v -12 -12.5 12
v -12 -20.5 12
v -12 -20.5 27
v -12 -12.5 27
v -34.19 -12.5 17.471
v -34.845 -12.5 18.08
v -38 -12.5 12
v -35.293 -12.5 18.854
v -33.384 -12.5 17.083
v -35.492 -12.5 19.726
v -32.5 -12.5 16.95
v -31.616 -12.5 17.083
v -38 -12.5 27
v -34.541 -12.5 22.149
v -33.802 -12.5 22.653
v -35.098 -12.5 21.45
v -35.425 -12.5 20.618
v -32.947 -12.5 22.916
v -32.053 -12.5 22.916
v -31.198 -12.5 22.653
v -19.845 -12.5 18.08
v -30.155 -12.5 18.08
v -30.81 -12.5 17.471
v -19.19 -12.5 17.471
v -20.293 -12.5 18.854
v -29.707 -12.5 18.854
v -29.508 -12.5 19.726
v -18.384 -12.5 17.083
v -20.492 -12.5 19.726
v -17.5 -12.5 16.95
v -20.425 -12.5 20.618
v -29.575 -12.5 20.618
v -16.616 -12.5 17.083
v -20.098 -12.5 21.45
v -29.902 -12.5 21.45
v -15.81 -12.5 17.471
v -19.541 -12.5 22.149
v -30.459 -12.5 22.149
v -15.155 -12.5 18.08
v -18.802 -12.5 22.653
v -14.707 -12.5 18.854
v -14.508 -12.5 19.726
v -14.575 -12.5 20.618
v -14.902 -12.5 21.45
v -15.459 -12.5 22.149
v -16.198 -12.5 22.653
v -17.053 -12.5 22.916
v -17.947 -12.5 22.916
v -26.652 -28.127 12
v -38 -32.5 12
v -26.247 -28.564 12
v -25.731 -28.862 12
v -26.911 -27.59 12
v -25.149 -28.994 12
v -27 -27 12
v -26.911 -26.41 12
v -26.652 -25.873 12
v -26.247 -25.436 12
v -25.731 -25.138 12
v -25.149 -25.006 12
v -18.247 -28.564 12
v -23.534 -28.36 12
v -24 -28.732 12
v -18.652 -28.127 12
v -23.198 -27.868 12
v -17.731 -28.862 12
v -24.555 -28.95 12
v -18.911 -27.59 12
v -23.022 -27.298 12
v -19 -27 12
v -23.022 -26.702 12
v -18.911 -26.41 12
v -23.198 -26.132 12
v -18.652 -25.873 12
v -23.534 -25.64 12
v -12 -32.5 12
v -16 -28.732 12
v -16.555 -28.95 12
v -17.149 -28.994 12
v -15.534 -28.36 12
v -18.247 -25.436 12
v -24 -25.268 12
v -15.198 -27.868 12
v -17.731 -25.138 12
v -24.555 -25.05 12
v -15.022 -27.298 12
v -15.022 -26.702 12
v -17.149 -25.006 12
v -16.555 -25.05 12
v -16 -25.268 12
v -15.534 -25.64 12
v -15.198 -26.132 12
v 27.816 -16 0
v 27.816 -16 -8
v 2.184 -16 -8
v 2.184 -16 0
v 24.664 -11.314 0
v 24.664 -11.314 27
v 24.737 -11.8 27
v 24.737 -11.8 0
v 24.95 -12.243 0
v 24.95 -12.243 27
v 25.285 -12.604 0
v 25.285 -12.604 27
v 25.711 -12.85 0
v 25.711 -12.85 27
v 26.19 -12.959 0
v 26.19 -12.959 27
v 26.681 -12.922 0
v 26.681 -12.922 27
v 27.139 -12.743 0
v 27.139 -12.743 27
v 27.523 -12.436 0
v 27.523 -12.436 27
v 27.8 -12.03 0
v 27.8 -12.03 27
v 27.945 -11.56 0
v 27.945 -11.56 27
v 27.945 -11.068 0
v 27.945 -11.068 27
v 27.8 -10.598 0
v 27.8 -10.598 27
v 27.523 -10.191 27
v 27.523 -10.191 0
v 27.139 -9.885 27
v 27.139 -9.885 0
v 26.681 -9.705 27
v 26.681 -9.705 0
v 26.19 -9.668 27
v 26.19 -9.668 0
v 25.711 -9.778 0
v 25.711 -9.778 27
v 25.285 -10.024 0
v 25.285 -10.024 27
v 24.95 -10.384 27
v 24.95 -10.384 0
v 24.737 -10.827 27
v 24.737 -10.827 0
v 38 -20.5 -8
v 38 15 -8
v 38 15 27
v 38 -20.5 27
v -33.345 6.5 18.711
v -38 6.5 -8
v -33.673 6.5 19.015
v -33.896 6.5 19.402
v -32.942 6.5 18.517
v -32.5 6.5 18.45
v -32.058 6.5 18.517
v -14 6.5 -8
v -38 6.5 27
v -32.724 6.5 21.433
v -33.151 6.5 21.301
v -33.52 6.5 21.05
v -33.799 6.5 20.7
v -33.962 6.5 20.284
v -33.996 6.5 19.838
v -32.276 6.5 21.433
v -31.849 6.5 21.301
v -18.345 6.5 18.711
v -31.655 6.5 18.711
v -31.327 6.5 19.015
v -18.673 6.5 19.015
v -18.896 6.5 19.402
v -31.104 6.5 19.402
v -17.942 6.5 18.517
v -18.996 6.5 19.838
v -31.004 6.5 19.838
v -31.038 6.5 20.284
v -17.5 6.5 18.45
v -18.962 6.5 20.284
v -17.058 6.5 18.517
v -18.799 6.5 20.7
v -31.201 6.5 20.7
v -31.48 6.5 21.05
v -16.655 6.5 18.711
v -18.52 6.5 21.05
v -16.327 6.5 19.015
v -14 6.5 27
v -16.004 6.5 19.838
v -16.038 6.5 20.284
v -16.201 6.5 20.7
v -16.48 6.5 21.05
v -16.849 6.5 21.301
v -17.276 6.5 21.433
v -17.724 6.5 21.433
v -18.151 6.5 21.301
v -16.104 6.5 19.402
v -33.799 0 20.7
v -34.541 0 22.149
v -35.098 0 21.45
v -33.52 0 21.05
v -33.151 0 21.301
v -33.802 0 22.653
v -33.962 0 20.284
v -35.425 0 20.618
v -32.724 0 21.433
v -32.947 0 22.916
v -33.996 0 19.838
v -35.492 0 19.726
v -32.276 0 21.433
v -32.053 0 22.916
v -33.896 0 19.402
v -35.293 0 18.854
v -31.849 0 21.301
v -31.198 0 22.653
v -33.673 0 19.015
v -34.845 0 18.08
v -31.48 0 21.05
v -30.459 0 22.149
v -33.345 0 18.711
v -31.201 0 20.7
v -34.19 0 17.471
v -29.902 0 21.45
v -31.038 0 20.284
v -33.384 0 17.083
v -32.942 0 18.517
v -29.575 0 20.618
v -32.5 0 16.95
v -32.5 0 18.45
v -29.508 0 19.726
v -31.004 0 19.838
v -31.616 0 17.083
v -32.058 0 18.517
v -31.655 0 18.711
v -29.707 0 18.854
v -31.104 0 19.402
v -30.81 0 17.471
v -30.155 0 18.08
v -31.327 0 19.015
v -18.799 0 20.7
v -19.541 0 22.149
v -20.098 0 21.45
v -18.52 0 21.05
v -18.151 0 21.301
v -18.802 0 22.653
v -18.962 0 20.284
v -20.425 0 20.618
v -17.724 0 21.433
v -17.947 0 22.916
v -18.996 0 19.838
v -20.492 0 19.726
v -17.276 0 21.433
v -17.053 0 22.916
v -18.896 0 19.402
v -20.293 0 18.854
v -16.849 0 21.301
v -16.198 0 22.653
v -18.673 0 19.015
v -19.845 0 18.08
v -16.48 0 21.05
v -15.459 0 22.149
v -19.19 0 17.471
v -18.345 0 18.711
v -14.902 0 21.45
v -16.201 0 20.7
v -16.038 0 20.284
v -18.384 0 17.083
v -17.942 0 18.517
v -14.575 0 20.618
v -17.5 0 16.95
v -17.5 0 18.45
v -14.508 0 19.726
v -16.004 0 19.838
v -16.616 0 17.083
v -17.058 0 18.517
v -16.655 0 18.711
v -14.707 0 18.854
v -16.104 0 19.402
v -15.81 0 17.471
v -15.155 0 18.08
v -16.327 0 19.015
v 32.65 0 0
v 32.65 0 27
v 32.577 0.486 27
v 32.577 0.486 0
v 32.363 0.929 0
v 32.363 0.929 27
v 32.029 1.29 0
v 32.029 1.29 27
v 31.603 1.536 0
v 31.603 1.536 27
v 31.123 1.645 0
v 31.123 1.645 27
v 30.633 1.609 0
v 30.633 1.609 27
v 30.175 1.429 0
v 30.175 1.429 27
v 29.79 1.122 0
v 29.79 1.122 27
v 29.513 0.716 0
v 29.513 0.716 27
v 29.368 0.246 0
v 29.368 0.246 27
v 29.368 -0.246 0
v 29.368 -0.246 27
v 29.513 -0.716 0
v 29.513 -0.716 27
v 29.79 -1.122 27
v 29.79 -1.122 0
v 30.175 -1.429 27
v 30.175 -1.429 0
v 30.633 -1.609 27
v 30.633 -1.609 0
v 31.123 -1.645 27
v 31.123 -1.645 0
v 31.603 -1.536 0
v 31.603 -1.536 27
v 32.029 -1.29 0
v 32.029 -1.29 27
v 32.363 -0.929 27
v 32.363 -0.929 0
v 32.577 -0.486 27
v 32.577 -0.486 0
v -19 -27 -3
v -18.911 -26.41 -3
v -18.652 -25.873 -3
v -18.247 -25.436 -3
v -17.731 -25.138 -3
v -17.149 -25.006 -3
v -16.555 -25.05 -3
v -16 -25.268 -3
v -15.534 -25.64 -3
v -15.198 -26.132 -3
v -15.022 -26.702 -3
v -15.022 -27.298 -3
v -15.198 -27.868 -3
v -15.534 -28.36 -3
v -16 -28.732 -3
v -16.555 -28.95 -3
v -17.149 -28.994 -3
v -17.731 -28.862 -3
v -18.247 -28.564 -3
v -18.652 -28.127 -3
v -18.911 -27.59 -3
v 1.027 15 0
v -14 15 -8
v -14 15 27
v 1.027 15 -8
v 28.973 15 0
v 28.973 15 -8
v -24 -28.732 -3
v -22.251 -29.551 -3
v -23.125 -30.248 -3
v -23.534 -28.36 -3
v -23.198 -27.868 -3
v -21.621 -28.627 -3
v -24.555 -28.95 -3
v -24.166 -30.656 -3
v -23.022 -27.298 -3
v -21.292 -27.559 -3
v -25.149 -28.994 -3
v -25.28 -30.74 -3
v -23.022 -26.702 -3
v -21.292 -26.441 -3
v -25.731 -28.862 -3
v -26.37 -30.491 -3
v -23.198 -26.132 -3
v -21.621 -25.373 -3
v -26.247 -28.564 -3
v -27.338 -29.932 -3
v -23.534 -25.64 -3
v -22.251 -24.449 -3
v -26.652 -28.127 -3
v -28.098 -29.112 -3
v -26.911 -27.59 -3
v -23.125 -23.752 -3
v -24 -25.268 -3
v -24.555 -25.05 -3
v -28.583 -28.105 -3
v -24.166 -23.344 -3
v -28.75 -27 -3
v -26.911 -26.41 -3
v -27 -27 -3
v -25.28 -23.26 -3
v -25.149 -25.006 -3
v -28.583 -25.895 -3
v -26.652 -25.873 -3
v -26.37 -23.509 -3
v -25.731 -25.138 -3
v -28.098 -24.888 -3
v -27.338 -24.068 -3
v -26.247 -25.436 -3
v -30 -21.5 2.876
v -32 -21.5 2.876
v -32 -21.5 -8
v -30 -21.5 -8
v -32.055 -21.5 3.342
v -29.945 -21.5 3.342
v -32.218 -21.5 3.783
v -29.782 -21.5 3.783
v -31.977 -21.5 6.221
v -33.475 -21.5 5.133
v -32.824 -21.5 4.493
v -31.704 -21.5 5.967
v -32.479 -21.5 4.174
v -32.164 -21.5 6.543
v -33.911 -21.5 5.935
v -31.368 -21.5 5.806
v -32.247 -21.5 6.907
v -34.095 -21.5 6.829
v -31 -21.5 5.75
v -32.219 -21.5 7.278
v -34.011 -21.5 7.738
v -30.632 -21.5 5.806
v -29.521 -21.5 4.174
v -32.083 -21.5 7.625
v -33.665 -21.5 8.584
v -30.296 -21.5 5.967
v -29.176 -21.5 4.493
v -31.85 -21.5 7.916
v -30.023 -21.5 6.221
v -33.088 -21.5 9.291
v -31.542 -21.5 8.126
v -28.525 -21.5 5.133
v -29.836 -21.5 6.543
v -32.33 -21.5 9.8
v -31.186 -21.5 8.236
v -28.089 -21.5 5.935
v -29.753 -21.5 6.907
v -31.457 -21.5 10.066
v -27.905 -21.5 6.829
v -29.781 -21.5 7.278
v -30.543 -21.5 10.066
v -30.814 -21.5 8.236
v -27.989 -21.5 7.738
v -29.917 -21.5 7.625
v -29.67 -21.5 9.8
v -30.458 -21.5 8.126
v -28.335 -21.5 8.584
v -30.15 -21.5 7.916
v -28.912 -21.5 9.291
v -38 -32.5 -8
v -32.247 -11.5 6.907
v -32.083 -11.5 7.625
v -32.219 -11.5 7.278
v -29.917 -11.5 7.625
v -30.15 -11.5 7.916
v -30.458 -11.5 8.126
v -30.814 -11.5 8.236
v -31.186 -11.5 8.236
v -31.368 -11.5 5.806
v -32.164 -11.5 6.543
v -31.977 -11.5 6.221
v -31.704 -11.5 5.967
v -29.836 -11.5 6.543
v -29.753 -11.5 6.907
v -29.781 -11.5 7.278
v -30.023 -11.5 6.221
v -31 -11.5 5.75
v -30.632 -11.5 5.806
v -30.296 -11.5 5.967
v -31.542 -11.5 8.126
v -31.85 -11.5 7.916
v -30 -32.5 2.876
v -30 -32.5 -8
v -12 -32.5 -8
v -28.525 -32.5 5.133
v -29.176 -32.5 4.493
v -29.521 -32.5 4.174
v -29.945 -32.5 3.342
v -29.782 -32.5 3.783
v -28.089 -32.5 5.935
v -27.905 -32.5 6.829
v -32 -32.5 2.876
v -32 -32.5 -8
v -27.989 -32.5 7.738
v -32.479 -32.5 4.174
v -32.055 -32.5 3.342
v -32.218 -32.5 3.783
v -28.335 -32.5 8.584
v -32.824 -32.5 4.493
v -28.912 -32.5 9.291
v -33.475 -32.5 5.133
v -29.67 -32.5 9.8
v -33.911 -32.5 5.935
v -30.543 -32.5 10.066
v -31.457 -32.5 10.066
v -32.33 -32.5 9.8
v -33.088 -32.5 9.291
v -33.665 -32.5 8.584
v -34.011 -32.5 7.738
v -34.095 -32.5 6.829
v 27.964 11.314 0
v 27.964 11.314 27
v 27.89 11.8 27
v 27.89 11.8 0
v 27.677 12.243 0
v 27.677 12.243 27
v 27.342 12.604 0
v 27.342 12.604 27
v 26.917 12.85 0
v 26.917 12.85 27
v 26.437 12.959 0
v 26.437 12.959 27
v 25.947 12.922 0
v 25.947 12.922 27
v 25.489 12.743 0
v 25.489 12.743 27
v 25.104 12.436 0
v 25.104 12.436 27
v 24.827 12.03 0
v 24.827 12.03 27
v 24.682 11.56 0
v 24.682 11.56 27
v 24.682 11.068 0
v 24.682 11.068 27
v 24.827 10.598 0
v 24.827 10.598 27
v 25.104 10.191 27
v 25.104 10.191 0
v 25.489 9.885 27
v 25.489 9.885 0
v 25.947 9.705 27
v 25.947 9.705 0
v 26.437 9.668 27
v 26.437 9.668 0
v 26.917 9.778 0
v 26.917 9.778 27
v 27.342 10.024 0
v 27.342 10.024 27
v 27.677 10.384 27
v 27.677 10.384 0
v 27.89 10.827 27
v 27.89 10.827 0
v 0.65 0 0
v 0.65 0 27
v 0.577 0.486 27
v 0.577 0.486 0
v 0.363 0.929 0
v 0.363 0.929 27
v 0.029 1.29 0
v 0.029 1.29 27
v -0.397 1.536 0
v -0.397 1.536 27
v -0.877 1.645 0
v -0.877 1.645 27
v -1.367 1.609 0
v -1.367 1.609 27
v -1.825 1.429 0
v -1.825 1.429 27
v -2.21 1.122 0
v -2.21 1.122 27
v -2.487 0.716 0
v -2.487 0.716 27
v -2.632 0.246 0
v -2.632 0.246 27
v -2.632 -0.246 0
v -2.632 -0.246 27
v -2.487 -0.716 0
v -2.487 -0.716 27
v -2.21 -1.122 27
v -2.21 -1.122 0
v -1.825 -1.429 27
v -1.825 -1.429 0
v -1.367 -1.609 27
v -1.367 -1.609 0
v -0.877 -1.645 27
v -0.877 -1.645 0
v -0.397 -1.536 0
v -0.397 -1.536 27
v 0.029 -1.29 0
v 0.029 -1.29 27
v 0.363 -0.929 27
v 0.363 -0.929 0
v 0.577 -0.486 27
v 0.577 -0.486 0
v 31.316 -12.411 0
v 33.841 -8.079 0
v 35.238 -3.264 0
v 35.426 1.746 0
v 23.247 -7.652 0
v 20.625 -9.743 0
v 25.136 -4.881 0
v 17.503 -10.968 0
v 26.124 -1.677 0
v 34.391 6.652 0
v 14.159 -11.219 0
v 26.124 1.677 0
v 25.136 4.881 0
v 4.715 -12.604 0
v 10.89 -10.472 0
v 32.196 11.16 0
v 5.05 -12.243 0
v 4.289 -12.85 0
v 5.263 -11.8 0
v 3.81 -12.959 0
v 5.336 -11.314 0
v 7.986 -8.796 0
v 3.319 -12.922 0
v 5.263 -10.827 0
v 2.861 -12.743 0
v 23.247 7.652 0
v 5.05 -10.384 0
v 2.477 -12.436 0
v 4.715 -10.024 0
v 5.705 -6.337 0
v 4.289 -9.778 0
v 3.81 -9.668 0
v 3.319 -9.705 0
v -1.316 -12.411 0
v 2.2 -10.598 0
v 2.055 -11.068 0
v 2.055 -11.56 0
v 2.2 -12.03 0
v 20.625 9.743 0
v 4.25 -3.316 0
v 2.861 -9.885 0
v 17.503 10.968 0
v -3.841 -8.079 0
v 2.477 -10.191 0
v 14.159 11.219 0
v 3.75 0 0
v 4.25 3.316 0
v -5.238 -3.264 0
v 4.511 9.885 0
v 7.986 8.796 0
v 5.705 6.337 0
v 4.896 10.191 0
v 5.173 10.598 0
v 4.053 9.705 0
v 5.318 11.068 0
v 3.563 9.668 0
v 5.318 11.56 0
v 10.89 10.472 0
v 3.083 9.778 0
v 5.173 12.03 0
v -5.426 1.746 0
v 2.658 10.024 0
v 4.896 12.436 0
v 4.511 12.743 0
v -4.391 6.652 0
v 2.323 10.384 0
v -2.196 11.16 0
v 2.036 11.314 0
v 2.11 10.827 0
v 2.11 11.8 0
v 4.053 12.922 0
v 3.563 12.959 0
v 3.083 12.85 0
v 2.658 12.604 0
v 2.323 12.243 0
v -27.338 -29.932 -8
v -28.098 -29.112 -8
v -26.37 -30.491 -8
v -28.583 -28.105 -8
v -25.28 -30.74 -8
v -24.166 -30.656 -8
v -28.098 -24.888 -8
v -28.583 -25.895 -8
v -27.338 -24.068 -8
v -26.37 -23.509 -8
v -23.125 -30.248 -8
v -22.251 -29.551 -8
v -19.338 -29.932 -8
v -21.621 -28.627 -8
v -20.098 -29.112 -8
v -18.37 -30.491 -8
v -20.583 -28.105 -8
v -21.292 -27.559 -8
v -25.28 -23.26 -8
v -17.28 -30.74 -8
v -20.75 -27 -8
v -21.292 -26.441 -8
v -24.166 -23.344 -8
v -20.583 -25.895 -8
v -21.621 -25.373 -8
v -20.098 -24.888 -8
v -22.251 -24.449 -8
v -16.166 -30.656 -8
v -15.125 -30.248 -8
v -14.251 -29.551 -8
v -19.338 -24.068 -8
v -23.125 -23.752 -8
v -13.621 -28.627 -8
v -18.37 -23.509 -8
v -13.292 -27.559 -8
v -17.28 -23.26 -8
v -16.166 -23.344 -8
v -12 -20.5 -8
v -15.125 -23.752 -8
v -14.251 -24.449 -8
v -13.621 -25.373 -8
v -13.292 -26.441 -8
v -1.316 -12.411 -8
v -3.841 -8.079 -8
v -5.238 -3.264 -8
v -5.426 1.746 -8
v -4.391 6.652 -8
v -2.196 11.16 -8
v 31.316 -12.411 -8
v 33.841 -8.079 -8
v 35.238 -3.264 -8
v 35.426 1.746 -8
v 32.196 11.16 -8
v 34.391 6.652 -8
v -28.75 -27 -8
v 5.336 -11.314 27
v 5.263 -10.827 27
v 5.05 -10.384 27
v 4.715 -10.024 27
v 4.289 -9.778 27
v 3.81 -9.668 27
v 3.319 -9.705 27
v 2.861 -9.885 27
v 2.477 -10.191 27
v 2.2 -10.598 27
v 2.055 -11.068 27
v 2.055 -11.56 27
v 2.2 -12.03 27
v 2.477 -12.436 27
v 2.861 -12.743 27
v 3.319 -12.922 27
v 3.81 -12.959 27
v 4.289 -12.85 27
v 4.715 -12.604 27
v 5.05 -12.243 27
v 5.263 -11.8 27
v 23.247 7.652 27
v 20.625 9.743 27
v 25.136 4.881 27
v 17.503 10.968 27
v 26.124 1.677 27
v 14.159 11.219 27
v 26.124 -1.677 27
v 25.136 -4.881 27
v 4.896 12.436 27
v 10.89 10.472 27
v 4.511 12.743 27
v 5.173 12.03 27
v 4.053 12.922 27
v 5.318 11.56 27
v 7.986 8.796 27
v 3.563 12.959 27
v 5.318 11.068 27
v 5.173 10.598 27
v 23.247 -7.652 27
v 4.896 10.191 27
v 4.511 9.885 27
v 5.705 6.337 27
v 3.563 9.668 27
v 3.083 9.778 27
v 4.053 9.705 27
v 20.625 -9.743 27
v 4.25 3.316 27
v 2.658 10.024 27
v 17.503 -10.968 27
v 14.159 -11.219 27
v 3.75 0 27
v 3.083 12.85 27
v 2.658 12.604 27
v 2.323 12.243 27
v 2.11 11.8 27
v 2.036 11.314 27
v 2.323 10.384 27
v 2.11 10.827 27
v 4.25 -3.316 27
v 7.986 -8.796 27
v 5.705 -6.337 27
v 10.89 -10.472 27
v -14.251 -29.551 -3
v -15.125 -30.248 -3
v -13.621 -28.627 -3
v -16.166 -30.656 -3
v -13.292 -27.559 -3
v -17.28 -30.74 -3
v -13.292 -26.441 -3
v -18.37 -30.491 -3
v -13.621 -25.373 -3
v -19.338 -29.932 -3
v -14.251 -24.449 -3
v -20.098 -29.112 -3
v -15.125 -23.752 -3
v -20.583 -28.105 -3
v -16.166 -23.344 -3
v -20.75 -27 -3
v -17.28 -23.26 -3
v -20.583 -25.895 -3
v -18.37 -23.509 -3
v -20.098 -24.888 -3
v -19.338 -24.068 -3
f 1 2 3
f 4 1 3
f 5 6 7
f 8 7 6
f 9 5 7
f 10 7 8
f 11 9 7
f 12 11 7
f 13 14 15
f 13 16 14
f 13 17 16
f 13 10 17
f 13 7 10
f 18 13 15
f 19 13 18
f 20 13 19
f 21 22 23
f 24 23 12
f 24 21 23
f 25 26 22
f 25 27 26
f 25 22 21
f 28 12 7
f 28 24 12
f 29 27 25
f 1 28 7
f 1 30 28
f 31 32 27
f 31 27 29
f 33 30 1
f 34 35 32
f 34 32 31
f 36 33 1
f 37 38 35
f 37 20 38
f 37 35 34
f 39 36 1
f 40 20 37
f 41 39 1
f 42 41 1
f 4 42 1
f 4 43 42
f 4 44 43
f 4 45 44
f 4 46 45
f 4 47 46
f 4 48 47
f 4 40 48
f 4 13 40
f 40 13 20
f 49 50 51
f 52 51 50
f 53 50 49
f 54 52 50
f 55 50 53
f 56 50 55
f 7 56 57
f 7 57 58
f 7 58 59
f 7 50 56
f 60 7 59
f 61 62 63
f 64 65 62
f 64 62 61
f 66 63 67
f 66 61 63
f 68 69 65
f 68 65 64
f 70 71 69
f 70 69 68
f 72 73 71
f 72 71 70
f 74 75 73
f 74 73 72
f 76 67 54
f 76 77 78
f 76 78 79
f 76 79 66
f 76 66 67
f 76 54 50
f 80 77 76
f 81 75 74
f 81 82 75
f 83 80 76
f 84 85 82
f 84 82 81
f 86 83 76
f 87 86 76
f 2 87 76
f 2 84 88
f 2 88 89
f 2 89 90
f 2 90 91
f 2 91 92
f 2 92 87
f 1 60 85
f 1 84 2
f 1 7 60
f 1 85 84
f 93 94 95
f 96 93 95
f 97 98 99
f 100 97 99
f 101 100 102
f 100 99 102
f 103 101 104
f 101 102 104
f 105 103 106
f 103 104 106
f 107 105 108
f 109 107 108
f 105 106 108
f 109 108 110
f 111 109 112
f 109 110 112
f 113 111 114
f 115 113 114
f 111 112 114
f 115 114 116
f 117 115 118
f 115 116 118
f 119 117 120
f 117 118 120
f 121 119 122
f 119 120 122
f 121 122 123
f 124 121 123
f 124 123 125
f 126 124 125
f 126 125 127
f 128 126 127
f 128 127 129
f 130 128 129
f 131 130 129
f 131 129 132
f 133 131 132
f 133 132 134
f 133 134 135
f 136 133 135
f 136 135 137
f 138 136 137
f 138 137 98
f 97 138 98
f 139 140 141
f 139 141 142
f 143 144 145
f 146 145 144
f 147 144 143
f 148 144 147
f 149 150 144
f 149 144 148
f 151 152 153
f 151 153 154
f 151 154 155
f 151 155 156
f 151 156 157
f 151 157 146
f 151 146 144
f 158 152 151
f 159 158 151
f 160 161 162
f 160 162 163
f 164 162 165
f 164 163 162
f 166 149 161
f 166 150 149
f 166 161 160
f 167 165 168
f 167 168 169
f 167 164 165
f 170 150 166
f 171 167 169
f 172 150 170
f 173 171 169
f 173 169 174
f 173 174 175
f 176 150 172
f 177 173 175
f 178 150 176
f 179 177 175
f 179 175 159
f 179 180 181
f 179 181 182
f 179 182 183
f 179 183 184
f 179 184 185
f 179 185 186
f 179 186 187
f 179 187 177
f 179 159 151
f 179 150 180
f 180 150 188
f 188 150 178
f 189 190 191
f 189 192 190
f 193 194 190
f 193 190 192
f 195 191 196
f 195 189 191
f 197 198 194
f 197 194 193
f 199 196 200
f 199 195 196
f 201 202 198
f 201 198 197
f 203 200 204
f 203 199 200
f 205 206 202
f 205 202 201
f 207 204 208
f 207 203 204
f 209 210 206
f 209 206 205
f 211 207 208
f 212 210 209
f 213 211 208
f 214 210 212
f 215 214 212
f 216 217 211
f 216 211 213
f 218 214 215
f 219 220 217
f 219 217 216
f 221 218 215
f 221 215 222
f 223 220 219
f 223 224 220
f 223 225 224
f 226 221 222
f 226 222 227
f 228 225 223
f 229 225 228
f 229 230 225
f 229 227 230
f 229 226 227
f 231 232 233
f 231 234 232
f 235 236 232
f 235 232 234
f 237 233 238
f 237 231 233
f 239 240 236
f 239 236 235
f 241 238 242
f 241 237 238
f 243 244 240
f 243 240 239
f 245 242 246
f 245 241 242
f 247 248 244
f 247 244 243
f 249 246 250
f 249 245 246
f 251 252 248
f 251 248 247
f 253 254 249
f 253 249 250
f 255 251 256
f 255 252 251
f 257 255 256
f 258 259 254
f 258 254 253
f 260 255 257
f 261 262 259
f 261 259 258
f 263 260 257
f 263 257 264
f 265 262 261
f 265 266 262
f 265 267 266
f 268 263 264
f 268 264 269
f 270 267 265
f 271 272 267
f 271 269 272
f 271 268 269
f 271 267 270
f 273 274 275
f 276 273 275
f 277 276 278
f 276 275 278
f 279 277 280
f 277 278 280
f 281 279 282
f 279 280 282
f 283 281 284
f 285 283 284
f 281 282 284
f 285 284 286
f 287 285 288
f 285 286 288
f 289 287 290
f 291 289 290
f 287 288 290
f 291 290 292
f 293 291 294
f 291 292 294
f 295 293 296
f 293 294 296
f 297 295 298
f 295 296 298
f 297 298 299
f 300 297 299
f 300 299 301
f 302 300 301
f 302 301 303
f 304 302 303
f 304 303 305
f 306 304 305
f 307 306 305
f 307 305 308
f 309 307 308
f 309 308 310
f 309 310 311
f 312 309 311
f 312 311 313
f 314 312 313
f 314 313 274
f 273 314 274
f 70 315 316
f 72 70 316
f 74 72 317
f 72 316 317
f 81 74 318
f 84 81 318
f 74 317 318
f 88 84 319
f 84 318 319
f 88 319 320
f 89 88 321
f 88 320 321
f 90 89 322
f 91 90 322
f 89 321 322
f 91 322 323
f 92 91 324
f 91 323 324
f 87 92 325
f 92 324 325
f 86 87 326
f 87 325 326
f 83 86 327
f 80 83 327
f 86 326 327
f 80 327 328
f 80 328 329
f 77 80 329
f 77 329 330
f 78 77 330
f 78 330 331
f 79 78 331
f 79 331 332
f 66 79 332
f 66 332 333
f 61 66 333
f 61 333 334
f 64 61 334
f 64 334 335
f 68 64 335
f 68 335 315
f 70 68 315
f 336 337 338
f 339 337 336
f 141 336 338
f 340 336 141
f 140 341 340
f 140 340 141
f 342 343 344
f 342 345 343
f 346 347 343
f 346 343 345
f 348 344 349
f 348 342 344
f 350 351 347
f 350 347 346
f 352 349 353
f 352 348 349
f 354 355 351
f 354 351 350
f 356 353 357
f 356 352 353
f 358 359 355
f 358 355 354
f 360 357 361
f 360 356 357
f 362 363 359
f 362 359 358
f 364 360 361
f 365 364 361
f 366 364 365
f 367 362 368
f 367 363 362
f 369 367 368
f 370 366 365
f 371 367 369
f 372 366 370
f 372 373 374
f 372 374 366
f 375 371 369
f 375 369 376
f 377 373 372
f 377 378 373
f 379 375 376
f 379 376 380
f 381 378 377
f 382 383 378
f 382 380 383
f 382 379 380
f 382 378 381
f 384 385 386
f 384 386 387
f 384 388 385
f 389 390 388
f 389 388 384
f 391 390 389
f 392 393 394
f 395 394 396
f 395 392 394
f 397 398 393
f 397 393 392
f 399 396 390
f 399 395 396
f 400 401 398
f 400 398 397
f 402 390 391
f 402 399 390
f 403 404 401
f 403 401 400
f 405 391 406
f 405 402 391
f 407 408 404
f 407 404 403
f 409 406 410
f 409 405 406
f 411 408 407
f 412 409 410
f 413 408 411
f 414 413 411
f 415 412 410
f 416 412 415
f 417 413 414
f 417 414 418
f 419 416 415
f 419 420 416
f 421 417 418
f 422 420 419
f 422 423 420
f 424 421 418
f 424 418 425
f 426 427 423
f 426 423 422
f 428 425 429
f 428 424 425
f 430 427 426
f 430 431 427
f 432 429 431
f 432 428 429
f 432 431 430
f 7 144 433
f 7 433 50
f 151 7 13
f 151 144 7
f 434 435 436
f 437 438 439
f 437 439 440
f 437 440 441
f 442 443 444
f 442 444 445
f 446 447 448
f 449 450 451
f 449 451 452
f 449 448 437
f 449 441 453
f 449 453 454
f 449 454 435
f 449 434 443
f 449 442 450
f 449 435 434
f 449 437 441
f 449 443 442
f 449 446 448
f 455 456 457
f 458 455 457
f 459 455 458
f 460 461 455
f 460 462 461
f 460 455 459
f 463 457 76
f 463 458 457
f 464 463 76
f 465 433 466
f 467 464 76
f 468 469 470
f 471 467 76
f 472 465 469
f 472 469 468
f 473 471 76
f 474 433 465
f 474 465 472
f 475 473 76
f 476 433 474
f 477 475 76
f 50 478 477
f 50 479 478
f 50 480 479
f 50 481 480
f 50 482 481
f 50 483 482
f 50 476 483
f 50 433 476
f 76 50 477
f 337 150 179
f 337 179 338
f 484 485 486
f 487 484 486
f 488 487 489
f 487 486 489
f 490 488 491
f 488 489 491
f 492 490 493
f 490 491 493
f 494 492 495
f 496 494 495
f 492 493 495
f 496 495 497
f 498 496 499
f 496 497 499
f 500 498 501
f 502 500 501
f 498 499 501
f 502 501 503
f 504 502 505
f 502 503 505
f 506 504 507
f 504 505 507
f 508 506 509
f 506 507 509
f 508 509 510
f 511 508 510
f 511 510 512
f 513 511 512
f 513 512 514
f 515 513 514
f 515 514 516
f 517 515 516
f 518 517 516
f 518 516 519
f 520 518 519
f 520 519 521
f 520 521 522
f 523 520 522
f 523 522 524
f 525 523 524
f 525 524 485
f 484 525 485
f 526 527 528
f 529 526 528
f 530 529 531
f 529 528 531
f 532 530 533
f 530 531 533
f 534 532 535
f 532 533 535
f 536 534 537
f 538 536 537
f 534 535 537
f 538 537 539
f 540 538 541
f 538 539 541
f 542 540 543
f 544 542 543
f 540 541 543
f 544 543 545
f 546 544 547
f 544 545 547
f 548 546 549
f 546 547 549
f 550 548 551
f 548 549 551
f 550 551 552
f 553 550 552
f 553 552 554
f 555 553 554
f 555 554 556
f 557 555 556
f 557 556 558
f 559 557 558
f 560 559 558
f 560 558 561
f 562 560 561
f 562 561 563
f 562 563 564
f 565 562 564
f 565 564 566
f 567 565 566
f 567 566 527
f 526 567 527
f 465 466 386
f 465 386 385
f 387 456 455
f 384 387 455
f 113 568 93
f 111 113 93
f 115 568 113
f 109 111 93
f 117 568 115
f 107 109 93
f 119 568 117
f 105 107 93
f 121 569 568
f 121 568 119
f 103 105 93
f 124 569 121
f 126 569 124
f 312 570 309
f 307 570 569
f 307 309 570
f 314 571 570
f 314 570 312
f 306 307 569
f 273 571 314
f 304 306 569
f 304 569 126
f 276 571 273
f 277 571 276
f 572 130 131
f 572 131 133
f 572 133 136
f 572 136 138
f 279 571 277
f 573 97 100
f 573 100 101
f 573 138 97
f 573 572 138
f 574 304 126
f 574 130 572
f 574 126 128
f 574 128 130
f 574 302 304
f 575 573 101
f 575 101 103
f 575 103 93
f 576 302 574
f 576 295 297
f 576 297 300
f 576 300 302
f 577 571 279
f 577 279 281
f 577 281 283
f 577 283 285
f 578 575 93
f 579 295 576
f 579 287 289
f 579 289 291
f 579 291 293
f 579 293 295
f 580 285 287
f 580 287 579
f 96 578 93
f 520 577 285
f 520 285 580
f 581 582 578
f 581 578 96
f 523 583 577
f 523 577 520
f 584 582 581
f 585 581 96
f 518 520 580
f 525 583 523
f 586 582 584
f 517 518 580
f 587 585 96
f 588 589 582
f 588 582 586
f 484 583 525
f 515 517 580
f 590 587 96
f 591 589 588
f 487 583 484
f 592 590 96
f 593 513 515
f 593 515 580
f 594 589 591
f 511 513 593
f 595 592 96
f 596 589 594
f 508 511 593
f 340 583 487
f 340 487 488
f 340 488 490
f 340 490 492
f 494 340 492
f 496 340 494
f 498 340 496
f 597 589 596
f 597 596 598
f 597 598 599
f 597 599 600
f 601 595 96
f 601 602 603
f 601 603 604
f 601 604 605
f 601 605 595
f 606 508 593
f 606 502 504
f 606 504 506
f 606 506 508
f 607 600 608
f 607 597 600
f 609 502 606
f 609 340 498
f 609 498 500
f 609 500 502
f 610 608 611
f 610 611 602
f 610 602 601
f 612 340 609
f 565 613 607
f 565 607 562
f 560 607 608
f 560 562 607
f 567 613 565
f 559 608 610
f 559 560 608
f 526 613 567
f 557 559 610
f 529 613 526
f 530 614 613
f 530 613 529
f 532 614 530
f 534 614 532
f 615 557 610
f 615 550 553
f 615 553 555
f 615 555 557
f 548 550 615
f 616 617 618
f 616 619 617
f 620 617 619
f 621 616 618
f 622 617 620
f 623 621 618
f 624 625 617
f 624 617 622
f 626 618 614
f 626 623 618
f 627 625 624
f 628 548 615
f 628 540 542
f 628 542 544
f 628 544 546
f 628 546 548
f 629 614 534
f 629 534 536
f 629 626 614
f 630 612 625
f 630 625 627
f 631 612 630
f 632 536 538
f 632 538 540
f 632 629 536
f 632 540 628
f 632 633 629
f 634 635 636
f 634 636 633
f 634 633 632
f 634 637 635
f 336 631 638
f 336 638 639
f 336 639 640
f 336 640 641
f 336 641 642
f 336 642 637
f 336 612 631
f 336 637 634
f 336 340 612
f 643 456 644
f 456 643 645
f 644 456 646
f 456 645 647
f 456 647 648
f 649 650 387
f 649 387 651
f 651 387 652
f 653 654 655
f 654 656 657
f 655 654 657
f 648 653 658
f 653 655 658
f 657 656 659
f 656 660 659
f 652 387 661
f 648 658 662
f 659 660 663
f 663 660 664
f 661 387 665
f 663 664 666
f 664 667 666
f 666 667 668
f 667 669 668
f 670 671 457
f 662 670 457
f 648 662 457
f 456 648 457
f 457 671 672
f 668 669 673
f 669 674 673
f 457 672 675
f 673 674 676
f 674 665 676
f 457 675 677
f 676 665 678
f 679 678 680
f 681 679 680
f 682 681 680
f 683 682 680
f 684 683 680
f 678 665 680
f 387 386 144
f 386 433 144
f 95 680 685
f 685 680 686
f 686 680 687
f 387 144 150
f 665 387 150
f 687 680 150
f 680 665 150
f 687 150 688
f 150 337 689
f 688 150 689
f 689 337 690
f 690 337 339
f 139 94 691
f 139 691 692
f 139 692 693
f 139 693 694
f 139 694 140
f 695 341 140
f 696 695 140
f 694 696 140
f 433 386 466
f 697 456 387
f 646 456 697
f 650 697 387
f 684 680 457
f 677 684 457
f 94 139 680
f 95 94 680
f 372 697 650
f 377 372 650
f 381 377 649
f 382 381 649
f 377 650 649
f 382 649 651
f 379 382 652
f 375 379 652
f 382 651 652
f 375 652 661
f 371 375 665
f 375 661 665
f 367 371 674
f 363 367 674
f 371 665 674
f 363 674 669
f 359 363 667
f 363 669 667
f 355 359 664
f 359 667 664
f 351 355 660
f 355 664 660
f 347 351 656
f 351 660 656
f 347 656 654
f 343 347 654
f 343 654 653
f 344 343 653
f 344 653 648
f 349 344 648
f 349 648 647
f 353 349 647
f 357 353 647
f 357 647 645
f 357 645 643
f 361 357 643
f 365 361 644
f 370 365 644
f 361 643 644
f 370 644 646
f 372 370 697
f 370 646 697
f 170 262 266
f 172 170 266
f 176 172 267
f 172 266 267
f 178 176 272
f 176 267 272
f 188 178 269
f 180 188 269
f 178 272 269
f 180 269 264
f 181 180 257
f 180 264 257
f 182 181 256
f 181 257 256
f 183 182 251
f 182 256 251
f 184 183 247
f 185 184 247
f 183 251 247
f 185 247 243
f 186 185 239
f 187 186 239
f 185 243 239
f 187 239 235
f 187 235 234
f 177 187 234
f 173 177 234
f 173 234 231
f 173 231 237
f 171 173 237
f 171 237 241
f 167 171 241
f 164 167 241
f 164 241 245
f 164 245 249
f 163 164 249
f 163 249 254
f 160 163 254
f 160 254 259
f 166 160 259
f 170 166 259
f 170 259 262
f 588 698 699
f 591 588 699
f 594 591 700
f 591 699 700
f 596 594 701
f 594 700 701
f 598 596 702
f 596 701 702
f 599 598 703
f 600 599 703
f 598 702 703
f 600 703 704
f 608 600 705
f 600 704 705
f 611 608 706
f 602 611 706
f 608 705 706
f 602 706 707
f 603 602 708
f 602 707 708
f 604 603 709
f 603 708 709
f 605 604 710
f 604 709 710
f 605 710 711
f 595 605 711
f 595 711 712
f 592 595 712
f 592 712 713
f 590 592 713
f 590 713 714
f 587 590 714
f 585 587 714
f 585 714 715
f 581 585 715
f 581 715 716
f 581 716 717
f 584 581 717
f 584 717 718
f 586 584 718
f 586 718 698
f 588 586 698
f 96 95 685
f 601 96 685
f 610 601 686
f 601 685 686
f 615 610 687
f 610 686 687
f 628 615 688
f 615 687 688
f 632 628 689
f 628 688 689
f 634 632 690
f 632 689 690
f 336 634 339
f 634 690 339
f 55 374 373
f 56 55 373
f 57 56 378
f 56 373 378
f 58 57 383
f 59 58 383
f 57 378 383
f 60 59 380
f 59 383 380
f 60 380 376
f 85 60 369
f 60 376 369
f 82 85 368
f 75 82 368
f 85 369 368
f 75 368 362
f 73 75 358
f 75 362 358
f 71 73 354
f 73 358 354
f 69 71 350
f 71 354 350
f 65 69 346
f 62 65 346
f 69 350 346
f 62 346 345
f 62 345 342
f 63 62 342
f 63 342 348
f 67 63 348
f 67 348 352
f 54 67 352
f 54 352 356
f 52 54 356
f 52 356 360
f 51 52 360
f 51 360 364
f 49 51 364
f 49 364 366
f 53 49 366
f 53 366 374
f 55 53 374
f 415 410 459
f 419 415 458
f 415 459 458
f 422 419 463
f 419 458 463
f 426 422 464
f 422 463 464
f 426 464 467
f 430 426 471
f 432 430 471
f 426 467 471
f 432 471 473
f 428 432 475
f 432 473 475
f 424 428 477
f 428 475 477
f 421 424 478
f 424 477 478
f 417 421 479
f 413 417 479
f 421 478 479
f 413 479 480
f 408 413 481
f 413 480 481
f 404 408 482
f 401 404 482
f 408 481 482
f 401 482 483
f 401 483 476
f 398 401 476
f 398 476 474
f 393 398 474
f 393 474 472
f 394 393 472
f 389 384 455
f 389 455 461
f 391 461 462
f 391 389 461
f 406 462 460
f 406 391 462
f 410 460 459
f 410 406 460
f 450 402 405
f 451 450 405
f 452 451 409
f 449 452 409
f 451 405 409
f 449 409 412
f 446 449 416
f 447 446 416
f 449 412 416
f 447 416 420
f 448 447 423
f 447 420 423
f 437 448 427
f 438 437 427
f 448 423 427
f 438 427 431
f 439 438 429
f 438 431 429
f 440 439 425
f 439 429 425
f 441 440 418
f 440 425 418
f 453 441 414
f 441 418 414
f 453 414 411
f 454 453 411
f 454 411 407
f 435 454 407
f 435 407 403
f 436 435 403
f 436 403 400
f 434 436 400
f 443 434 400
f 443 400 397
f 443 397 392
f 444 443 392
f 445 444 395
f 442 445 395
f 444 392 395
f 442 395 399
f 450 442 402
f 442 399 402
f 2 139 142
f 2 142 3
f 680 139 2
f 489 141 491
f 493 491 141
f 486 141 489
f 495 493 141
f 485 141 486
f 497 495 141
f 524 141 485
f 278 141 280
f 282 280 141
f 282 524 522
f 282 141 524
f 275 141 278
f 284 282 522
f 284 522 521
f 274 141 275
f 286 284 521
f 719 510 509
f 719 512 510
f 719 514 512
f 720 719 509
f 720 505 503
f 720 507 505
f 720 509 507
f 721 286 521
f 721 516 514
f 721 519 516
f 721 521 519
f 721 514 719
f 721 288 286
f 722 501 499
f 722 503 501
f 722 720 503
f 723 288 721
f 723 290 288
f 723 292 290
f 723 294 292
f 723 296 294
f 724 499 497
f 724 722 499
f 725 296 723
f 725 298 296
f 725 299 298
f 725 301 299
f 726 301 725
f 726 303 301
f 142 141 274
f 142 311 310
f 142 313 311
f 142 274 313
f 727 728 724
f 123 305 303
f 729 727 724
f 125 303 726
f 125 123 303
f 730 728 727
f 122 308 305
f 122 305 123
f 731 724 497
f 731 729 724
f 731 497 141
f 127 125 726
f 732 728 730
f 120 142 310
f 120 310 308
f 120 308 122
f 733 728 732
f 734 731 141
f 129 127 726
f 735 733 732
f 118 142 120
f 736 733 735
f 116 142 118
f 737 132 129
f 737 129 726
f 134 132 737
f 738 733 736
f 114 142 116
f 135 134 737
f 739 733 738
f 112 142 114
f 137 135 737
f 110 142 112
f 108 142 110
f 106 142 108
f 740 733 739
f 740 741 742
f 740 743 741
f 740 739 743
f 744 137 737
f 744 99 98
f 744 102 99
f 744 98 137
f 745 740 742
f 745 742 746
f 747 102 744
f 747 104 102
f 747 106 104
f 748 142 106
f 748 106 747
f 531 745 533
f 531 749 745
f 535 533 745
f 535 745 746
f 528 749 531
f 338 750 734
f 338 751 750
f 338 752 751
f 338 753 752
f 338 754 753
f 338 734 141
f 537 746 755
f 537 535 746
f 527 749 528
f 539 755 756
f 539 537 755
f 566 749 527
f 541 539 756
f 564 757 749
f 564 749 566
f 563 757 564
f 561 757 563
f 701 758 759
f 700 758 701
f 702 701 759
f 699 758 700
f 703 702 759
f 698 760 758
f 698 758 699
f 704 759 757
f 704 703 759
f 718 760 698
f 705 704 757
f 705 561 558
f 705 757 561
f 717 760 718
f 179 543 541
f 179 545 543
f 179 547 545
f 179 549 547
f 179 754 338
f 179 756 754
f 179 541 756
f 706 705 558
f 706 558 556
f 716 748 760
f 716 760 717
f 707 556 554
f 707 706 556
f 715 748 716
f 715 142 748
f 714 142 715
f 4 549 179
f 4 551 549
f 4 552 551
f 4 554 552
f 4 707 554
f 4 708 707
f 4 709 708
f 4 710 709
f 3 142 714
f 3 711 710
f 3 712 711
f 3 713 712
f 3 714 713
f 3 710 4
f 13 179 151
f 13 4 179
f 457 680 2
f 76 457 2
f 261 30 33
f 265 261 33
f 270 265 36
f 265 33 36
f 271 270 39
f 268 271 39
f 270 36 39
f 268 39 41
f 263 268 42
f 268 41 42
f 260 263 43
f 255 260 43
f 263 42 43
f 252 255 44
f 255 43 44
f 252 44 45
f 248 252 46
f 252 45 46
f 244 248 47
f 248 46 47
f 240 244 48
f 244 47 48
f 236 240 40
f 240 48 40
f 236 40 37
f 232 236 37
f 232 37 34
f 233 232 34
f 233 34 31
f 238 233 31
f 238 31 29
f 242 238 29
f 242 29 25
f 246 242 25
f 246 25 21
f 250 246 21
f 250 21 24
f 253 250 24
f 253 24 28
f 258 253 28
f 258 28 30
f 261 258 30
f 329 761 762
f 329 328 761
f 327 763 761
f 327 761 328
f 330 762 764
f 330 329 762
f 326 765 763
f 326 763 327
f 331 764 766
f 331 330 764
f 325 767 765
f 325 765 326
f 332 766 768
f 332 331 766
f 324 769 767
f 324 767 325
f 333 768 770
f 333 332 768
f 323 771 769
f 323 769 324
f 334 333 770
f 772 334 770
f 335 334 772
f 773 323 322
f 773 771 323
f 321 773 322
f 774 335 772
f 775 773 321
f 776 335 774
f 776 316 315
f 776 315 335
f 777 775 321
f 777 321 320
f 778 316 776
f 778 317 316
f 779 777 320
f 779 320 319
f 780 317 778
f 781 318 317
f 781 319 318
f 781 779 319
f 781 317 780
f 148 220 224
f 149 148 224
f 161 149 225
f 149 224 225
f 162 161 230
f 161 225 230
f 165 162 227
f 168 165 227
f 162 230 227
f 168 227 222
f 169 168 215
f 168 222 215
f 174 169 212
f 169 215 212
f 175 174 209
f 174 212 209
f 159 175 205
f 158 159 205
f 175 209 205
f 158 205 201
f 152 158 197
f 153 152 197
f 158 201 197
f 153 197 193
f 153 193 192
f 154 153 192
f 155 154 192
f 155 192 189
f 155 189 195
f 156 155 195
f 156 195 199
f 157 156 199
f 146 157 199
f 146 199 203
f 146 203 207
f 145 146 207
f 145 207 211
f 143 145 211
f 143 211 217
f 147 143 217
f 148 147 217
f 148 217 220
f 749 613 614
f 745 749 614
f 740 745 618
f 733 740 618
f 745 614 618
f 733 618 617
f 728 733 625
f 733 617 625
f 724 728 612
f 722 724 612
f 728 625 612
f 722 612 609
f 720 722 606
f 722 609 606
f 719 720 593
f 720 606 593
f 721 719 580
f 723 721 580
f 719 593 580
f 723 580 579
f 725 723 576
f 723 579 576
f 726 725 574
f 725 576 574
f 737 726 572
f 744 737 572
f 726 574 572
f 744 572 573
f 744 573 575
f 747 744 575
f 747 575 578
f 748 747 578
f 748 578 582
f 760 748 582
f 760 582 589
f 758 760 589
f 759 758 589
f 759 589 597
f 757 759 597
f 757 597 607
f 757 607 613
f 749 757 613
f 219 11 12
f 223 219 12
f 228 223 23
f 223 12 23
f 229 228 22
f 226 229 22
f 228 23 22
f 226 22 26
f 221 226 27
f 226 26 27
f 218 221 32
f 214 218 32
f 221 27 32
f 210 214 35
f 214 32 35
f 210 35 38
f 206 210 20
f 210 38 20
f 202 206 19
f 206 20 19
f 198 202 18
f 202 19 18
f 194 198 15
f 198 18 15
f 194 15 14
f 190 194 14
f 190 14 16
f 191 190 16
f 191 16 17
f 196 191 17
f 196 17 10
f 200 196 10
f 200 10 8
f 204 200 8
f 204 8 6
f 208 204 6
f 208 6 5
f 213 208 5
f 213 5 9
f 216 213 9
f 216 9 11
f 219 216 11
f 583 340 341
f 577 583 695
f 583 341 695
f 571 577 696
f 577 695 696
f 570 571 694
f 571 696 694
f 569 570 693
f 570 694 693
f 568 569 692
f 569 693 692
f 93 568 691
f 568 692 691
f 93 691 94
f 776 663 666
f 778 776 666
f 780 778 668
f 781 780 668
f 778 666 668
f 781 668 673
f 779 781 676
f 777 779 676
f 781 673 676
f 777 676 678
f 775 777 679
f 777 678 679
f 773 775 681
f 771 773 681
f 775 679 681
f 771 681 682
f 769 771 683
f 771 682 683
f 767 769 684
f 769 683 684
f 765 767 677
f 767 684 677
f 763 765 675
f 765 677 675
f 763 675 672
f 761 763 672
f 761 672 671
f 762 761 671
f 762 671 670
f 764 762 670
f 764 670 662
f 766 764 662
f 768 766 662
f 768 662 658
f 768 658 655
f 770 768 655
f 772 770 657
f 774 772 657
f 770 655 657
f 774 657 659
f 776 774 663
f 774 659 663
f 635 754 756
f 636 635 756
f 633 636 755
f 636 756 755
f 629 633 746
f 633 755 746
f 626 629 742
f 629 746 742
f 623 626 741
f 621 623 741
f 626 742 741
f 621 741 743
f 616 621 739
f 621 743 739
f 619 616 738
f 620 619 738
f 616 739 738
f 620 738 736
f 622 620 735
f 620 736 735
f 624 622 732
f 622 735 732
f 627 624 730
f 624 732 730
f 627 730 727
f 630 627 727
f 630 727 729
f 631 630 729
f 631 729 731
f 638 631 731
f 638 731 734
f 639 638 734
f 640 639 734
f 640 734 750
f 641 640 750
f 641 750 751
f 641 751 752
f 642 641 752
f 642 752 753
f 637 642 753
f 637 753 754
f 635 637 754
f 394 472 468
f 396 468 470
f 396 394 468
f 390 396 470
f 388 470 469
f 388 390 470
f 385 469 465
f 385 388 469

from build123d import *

# Parameters (mm, degrees)
SKETCH_1_W           = 70
SKETCH_1_H           = 30
EXTRUDE_1_DEPTH      = 27
CUT_EXTRUDE_1_DEPTH  = 47.679760068
SKETCH_3_R           = 1.65
CUT_EXTRUDE_2_DEPTH  = 47.679760068
SKETCH_4_W           = 21
SKETCH_4_H           = 8.5
CUT_EXTRUDE_3_DEPTH  = 47.679760068
SKETCH_7_R           = 11.25
CUT_EXTRUDE_5_DEPTH  = 47.679760068
SKETCH_8_W           = 21.5
SKETCH_8_H           = 21.5
EXTRUDE_2_DEPTH      = 8
SKETCH_10_R          = 1.5
CUT_EXTRUDE_6_DEPTH  = 54.422841557
SKETCH_12_W          = 35
SKETCH_12_H          = 21.5
EXTRUDE_3_DEPTH      = 3
SKETCH_13_R          = 3
CUT_EXTRUDE_7_DEPTH  = 15
SKETCH_14_R          = 1.65
EXTRUDE_4_DEPTH      = 27
SKETCH_15_W          = 27
SKETCH_15_H          = 30
EXTRUDE_5_DEPTH      = 3
EXTRUDE_START        = 5.5
SKETCH_16_R          = 3
EXTRUDE_6_DEPTH      = 5.5
SKETCH_22_W          = 26
SKETCH_22_H          = 15
CUT_EXTRUDE_9_DEPTH  = 8
EXTRUDE_START_2      = 8
SKETCH_20_R          = 11.25
EXTRUDE_8_DEPTH      = 8
CUT_EXTRUDE_8_DEPTH  = 8
SKETCH_23_W          = 26
SKETCH_23_H          = 20
EXTRUDE_9_DEPTH      = 17
SKETCH_24_R          = 2
CUT_EXTRUDE_10_DEPTH = 64.837684795
SKETCH_25_R          = 3.75
CUT_EXTRUDE_11_DEPTH = 5
SKETCH_26_R          = 3.1
CUT_EXTRUDE_12_DEPTH = 16
SKETCH_27_R          = 1.25
CUT_EXTRUDE_13_DEPTH = 10
SKETCH_28_W          = 2
SKETCH_28_H          = 12.06571985
CUT_EXTRUDE_14_DEPTH = 16
FILLET_1_R           = 2
SKETCH_29_W          = 20
SKETCH_29_H          = 5
CUT_EXTRUDE_15_DEPTH = 89.945207853


with BuildPart() as part:
    # 草图1 → 凸台-拉伸1 (new body)
    with BuildSketch(Plane.XY):
        Rectangle(SKETCH_1_W, SKETCH_1_H)
    extrude(amount=EXTRUDE_1_DEPTH)

    # 草图2 → 切除-拉伸1 (cut, through all)
    with BuildSketch(Plane.XY.offset(27)):
        with BuildLine():
            Line((28.228756555, -15), (35, -15))
            Line((35, -15), (35, 0))
            ThreePointArc((35, 0), (33.228756555, -8.228756555), (28.228756555, -15))
        make_face()
        with BuildLine():
            ThreePointArc((28.228756555, 15), (33.228756555, 8.228756555), (35, 0))
            Line((35, 0), (35, 15))
            Line((35, 15), (28.228756555, 15))
        make_face()
    extrude(amount=-CUT_EXTRUDE_1_DEPTH, mode=Mode.SUBTRACT)

    # 草图3 → 切除-拉伸2 (cut, through all)
    with BuildSketch(Plane.XY.offset(27)):
        with Locations((31, 0)):
            Circle(SKETCH_3_R)
        with Locations((26.313708499, 11.313708499)):
            Circle(SKETCH_3_R)
        with Locations(Location((26.313708499, -11.313708499, 0), (0, 0, 180))):
            Circle(SKETCH_3_R)
        with Locations(Location((3.686291501, 11.313708499, 0), (0, 0, 180))):
            Circle(SKETCH_3_R)
        with Locations((3.686291501, -11.313708499)):
            Circle(SKETCH_3_R)
        with Locations((-1, 0)):
            Circle(SKETCH_3_R)
    extrude(amount=-CUT_EXTRUDE_2_DEPTH, mode=Mode.SUBTRACT)

    # 草图4 → 切除-拉伸3 (cut, through all)
    with BuildSketch(Plane.XY.offset(27)):
        with Locations((-24.5, 10.75)):
            Rectangle(SKETCH_4_W, SKETCH_4_H)
    extrude(amount=-CUT_EXTRUDE_3_DEPTH, mode=Mode.SUBTRACT)

    # 草图7 → 切除-拉伸5 (cut, through all)
    with BuildSketch(Plane(origin=(0, 0, 0), x_dir=(-1, 0, 0), z_dir=(0, 0, -1))):
        with Locations((-15, 0)):
            Circle(SKETCH_7_R)
    extrude(amount=-CUT_EXTRUDE_5_DEPTH, mode=Mode.SUBTRACT)

    # 草图8 → 凸台-拉伸2 (add)
    with BuildSketch(Plane(origin=(0, 0, 0), x_dir=(-1, 0, 0), z_dir=(0, 0, -1))):
        with Locations((24.25, -4.25)):
            Rectangle(SKETCH_8_W, SKETCH_8_H)
    extrude(amount=EXTRUDE_2_DEPTH)

    # 草图10 → 切除-拉伸6 (cut, through all)
    with BuildSketch(Plane.XZ.offset(15)):
        with Locations(Location((-17.5, 19.95, 0), (0, 0, 270))):
            Circle(SKETCH_10_R)
        with Locations(Location((-32.5, 19.95, 0), (0, 0, 270))):
            Circle(SKETCH_10_R)
    extrude(amount=-CUT_EXTRUDE_6_DEPTH, mode=Mode.SUBTRACT)

    # 草图12 → 凸台-拉伸3 (add)
    with BuildSketch(Plane.ZY.offset(35)):
        with Locations((9.5, -4.25)):
            Rectangle(SKETCH_12_W, SKETCH_12_H)
    extrude(amount=EXTRUDE_3_DEPTH)

    # 草图13 → 切除-拉伸7 (cut)
    with BuildSketch(Plane.XZ.offset(15)):
        with Locations(Location((-32.5, 19.95, 0), (0, 0, 270))):
            Circle(SKETCH_13_R)
        with Locations(Location((-17.5, 19.95, 0), (0, 0, 270))):
            Circle(SKETCH_13_R)
    extrude(amount=-CUT_EXTRUDE_7_DEPTH, mode=Mode.SUBTRACT)

    # 草图14 → 凸台-拉伸4 (add)
    with BuildSketch(Plane.XY.offset(27)):
        Polygon((28.228756555, -15), (35, -15), (35, 0), (35, 15), (28.228756555, 15), (28.228756555, 12.920752662), (28.228756555, 9.706664336), (28.228756555, 0), (28.228756555, -9.706664336), (28.228756555, -12.920752662), align=None)
        with Locations((31, 0)):
            Circle(SKETCH_14_R, mode=Mode.SUBTRACT)
    extrude(amount=-EXTRUDE_4_DEPTH)

    # 草图15 → 凸台-拉伸5 (add)
    with BuildSketch(Plane(origin=(35, 0, 0), x_dir=(0, 0, -1), z_dir=(1, 0, 0))):
        with Locations((-13.5, 0)):
            Rectangle(SKETCH_15_W, SKETCH_15_H)
    extrude(amount=EXTRUDE_5_DEPTH)

    # 草图16 → 凸台-拉伸6 (add)
    with BuildSketch(Plane.XZ.offset(15).offset(EXTRUDE_START)):
        Polygon((-13.5, 0), (38, 0), (38, 27), (-38, 27), (-38, -8), (-13.5, -8), align=None)
        with Locations(Location((-32.5, 19.95, 0), (0, 0, 270))):
            Circle(SKETCH_16_R, mode=Mode.SUBTRACT)
        with Locations(Location((-17.5, 19.95, 0), (0, 0, 270))):
            Circle(SKETCH_16_R, mode=Mode.SUBTRACT)
    extrude(amount=-EXTRUDE_6_DEPTH)

    # 草图22 → 切除-拉伸9 (cut)
    with BuildSketch(Plane.XZ.offset(20.5)):
        with Locations((-25, 19.5)):
            Rectangle(SKETCH_22_W, SKETCH_22_H)
    extrude(amount=-CUT_EXTRUDE_9_DEPTH, mode=Mode.SUBTRACT)

    # 草图20 → 凸台-拉伸8 (add)
    with BuildSketch(Plane(origin=(0, 0, 0), x_dir=(-1, 0, 0), z_dir=(0, 0, -1)).offset(EXTRUDE_START_2)):
        Polygon((14, 15), (-38, 15), (-38, -20.5), (13.5, -20.5), (13.5, 6.5), (14, 6.5), align=None)
        with Locations((-15, 0)):
            Circle(SKETCH_20_R, mode=Mode.SUBTRACT)
    extrude(amount=-EXTRUDE_8_DEPTH)

    # 草图21 → 切除-拉伸8 (cut)
    with BuildSketch(Plane(origin=(0, 0, -8), x_dir=(-1, 0, 0), z_dir=(0, 0, -1))):
        with BuildLine():
            Line((-27.816005618, -16), (-2.183994382, -16))
            ThreePointArc((-2.183994382, -16), (-15, 20.5), (-27.816005618, -16))
        make_face()
    extrude(amount=-CUT_EXTRUDE_8_DEPTH, mode=Mode.SUBTRACT)

    # 草图23 → 凸台-拉伸9 (add)
    with BuildSketch(Plane.XZ.offset(20.5)):
        with Locations((-25, 2)):
            Rectangle(SKETCH_23_W, SKETCH_23_H)
    extrude(amount=EXTRUDE_9_DEPTH)

    # 草图24 → 切除-拉伸10 (cut, through all)
    with BuildSketch(Plane(origin=(0, 0, -8), x_dir=(-1, 0, 0), z_dir=(0, 0, -1))):
        with Locations((17, -27)):
            Circle(SKETCH_24_R)
        with Locations((25, -27)):
            Circle(SKETCH_24_R)
    extrude(amount=-CUT_EXTRUDE_10_DEPTH, mode=Mode.SUBTRACT)

    # 草图25 → 切除-拉伸11 (cut)
    with BuildSketch(Plane(origin=(0, 0, -8), x_dir=(-1, 0, 0), z_dir=(0, 0, -1))):
        with Locations((17, -27)):
            Circle(SKETCH_25_R)
        with Locations((25, -27)):
            Circle(SKETCH_25_R)
    extrude(amount=-CUT_EXTRUDE_11_DEPTH, mode=Mode.SUBTRACT)

    # 草图26 → 切除-拉伸12 (cut)
    with BuildSketch(Plane.XZ.offset(37.5)):
        with Locations(Location((-31, 7, 0), (0, 0, 270))):
            Circle(SKETCH_26_R)
    extrude(amount=-CUT_EXTRUDE_12_DEPTH, mode=Mode.SUBTRACT)

    # 草图27 → 切除-拉伸13 (cut)
    with BuildSketch(Plane.XZ.offset(21.5)):
        with Locations(Location((-31, 7, 0), (0, 0, 270))):
            Circle(SKETCH_27_R)
    extrude(amount=-CUT_EXTRUDE_13_DEPTH, mode=Mode.SUBTRACT)

    # 草图28 → 切除-拉伸14 (cut)
    with BuildSketch(Plane.XZ.offset(37.5)):
        with Locations((-31, -1.967140075)):
            Rectangle(SKETCH_28_W, SKETCH_28_H)
    extrude(amount=-CUT_EXTRUDE_14_DEPTH, mode=Mode.SUBTRACT)

    # 圆角1
    fillet_1_edges = [part.edges().sort_by_distance(p)[0] for p in [
        (-32, -29.5, 4.06571985),
        (-30, -29.5, 4.06571985),
    ]]
    fillet(fillet_1_edges, radius=FILLET_1_R)

    # 草图29 → 切除-拉伸15 (cut, through all)
    with BuildSketch(Plane.ZY.offset(38)):
        with Locations((2, -35)):
            Rectangle(SKETCH_29_W, SKETCH_29_H)
    extrude(amount=-CUT_EXTRUDE_15_DEPTH, mode=Mode.SUBTRACT)


solid = part.part
